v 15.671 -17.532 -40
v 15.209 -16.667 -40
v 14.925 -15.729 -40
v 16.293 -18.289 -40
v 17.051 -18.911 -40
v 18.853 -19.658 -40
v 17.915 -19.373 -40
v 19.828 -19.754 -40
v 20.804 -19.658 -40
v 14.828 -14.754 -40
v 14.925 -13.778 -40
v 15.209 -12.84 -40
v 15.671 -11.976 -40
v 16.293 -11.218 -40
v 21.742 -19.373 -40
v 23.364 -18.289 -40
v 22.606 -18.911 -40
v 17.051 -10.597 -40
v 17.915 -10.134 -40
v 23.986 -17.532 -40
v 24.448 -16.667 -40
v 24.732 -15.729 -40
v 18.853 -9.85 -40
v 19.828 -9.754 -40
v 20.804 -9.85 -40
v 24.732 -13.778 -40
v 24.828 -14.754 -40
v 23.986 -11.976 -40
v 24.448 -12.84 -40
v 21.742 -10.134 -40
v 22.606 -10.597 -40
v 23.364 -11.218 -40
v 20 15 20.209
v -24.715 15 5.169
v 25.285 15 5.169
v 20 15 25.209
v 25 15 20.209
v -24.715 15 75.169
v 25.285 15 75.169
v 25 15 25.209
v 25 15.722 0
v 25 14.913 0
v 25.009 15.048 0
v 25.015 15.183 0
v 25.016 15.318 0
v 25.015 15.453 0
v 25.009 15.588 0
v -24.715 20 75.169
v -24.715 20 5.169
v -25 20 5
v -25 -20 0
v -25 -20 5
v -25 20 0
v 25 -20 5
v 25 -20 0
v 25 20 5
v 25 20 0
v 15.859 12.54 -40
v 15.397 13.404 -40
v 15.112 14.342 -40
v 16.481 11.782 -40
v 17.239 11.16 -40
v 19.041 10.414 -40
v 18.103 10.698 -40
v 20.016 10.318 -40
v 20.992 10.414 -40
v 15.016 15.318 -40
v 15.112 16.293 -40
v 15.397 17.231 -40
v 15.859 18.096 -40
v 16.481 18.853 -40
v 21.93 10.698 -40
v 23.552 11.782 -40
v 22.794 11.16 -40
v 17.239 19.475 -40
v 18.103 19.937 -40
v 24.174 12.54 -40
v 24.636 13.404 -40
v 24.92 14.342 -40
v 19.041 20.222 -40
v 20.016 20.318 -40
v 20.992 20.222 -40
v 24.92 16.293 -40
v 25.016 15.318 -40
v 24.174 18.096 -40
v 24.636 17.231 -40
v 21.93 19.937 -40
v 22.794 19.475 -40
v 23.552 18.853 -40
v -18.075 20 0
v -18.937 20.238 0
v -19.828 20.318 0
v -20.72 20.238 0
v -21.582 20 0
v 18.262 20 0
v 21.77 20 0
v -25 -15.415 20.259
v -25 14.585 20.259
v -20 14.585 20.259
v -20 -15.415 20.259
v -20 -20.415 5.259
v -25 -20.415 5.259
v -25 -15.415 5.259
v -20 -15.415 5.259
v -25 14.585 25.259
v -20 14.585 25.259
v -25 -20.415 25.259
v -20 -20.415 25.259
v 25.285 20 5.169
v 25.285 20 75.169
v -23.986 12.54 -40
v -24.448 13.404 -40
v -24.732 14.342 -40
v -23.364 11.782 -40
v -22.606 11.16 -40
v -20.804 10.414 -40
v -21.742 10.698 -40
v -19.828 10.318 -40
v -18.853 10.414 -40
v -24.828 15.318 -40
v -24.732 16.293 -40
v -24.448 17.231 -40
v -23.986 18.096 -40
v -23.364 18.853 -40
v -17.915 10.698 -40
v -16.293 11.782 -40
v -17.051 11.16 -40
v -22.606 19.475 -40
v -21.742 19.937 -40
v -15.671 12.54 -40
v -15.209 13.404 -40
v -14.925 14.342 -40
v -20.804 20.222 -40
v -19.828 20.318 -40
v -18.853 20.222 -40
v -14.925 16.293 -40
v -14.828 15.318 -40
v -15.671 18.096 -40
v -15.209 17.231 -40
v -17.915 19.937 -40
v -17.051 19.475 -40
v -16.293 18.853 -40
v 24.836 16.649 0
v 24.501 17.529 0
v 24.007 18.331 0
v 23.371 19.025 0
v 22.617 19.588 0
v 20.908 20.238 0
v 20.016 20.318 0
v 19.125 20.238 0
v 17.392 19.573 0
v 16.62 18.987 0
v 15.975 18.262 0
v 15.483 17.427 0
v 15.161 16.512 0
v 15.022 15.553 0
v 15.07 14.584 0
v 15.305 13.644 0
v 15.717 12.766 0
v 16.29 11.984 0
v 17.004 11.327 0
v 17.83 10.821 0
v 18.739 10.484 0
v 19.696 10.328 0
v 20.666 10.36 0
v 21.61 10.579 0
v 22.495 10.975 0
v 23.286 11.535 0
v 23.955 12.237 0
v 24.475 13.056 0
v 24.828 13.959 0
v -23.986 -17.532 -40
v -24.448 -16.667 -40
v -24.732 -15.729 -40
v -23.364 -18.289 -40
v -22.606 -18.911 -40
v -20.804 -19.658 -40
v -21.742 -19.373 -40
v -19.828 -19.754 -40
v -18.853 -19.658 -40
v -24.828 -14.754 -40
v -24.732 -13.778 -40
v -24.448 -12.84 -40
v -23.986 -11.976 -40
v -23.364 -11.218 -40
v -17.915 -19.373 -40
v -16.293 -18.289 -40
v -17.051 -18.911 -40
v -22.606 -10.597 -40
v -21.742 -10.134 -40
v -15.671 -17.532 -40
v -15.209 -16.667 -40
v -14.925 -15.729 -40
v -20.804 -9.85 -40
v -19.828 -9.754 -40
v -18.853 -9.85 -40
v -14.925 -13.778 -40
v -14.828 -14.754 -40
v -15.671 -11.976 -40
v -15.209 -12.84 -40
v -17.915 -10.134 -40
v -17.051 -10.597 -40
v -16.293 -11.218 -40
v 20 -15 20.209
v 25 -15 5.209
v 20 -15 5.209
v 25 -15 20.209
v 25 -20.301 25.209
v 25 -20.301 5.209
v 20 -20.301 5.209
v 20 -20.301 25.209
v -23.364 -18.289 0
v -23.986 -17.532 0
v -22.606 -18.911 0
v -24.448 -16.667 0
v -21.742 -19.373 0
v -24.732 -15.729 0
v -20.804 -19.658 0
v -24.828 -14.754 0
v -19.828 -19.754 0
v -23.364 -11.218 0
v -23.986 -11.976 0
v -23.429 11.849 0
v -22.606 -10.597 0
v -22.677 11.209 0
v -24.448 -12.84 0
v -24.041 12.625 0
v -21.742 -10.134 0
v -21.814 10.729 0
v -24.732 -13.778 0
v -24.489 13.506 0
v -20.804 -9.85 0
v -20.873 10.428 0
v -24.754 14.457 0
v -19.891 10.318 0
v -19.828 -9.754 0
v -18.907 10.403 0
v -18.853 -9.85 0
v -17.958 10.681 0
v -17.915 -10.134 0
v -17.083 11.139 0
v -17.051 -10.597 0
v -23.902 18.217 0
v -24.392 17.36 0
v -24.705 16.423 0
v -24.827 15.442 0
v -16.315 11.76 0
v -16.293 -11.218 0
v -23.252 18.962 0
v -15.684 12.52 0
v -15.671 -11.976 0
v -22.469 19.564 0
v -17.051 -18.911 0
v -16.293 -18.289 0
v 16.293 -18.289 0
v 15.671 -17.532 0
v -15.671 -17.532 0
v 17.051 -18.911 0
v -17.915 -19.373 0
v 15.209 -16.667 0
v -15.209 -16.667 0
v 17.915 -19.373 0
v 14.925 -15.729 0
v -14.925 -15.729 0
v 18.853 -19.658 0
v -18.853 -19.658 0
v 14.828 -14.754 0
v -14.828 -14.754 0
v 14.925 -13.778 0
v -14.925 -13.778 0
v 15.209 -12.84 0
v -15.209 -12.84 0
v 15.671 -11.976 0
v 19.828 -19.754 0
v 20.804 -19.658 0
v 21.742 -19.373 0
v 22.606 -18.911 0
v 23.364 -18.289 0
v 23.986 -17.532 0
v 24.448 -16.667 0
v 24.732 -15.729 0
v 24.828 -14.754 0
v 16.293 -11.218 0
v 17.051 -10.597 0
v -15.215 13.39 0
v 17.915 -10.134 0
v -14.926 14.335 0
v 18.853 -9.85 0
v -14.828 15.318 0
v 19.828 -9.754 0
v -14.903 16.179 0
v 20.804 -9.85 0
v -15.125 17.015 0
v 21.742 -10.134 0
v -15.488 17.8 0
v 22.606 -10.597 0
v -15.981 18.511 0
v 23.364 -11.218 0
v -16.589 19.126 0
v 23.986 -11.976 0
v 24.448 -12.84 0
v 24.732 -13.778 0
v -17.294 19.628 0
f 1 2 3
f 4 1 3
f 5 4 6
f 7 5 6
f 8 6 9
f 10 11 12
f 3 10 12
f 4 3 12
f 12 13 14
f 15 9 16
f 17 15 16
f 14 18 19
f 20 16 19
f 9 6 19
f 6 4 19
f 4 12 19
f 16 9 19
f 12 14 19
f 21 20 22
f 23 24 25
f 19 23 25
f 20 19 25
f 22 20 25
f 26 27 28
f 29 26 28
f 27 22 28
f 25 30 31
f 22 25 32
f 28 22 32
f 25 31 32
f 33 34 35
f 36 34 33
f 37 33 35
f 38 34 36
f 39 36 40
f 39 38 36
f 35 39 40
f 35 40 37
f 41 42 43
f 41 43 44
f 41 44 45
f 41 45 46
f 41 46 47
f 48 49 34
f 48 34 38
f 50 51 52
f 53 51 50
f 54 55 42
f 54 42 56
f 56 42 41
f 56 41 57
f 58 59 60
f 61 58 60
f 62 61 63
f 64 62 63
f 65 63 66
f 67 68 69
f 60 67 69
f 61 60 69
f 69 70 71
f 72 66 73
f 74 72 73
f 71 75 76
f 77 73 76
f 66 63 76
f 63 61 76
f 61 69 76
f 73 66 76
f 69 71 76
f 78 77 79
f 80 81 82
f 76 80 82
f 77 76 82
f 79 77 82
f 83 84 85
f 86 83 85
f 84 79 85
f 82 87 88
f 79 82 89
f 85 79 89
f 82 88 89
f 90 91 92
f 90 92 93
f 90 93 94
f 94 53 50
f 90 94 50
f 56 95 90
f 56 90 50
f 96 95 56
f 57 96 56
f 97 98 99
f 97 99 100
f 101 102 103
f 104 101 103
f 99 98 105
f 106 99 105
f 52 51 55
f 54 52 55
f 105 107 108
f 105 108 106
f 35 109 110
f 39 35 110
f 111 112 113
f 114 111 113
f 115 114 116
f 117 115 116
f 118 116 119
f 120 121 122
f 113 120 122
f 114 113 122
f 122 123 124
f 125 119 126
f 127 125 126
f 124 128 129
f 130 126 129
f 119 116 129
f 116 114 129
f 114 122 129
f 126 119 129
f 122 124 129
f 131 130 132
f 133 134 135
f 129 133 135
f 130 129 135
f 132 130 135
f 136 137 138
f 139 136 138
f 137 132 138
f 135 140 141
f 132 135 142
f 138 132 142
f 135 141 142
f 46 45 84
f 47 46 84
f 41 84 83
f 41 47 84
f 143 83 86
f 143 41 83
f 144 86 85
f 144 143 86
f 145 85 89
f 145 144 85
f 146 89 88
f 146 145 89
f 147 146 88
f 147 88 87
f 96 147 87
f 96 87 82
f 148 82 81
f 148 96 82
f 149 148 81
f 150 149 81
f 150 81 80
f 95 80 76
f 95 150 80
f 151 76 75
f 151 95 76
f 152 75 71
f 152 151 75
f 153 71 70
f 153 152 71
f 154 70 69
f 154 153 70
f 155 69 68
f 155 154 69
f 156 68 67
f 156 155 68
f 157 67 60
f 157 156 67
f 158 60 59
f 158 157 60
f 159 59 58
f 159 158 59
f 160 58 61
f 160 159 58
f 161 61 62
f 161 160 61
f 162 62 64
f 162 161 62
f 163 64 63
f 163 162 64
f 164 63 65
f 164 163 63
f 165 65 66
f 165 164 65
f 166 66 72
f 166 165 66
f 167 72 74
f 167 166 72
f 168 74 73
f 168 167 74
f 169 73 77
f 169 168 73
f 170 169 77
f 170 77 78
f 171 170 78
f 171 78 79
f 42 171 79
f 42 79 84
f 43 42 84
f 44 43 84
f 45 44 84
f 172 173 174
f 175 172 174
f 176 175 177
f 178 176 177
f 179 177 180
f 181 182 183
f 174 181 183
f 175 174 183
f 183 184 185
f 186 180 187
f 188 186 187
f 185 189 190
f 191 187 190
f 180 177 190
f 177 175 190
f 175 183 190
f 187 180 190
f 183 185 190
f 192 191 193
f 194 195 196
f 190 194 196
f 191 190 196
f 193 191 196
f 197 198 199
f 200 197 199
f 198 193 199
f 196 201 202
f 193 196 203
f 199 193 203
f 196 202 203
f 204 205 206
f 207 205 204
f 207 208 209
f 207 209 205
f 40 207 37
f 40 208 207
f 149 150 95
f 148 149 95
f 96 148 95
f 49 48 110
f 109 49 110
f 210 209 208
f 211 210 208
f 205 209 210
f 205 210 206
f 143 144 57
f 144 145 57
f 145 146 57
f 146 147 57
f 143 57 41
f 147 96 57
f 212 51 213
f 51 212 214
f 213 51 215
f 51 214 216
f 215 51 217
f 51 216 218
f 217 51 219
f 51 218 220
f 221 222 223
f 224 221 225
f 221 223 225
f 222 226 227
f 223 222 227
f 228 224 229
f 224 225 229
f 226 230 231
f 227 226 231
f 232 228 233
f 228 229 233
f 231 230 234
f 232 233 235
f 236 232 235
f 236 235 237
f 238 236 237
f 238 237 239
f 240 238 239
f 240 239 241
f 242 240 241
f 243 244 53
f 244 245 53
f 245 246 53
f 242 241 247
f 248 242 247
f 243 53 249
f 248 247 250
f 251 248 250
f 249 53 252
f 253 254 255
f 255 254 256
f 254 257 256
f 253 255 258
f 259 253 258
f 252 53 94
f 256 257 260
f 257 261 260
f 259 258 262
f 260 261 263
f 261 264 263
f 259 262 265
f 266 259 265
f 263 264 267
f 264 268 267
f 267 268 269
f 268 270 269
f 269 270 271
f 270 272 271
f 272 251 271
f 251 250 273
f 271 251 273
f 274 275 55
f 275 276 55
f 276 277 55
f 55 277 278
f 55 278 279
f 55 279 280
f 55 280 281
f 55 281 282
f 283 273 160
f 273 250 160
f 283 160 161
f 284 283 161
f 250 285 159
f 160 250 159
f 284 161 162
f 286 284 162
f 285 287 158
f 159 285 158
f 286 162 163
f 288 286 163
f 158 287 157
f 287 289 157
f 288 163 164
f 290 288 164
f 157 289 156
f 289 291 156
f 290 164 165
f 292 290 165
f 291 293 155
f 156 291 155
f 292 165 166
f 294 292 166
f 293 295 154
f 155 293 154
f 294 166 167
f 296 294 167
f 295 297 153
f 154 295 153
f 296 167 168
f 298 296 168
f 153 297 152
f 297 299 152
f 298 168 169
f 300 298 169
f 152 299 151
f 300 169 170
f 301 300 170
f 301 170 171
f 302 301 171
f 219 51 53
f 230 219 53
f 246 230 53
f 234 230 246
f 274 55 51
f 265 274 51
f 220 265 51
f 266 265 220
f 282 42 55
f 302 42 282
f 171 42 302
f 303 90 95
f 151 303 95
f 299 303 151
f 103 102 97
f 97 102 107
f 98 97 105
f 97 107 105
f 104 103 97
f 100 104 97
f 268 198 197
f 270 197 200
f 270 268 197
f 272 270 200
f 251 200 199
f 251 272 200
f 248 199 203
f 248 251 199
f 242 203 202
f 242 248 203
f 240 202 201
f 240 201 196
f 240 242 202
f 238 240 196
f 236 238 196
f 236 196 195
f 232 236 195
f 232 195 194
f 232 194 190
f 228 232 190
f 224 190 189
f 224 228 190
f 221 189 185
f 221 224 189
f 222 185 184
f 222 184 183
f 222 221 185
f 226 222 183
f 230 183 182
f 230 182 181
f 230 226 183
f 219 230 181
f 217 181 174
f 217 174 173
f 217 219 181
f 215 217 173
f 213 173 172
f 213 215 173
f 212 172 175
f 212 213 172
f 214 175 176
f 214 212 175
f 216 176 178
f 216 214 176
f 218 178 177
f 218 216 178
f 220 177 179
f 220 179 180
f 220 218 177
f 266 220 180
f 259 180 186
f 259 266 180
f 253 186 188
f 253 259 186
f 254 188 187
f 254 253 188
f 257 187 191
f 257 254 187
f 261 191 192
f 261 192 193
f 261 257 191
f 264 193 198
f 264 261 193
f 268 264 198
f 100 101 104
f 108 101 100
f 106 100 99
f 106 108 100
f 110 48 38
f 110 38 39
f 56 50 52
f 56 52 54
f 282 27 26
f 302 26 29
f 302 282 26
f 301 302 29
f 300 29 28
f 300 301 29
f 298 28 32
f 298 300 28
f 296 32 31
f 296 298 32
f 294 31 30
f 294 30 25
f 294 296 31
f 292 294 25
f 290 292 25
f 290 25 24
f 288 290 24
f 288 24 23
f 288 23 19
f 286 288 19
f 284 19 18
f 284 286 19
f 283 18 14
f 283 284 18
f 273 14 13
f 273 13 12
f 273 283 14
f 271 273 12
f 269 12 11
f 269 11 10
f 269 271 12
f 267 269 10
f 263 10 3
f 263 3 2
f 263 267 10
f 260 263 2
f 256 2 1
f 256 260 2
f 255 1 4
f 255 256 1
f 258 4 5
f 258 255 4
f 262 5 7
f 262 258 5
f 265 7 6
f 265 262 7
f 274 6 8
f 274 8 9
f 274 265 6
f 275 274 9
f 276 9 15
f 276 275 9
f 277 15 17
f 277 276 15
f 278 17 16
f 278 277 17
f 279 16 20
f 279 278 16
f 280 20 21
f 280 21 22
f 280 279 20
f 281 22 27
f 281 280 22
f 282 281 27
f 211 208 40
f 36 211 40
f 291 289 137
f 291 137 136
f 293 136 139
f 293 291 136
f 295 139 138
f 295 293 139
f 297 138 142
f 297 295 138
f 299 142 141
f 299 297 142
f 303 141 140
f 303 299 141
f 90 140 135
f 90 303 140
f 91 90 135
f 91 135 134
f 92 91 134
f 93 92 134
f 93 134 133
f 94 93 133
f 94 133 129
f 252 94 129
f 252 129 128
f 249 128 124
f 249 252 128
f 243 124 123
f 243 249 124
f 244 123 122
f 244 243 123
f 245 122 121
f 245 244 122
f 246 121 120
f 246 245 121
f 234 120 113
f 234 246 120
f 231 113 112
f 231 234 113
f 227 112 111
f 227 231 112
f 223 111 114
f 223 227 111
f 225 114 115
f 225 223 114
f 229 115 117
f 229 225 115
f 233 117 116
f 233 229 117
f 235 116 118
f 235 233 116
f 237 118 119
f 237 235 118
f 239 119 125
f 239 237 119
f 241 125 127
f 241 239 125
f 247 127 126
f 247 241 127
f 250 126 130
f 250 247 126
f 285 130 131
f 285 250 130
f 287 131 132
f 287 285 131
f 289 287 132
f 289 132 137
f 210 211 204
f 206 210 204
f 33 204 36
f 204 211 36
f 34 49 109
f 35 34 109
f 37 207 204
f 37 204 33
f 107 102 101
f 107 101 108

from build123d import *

# Parameters (mm, degrees)
F1_R      = 5
F2_DEPTH  = 40
F0_W      = 50
F0_H      = 40
F3_DEPTH  = 5
F5_W      = 50
F5_H      = 70
F6_DEPTH  = 5
F9_W      = 40
F9_H      = 20
F10_DEPTH = 5
F11_W     = 30
F11_H     = 15
F12_DEPTH = 5
F13_W     = 35
F13_H     = 20
F14_DEPTH = 5
F15_W     = 30
F15_H     = 15
F16_DEPTH = 5


with BuildPart() as f2:
    # F1 (on Top) → F2 (new body)
    with BuildSketch(Plane.XY):
        with Locations((-19.828461, 15.317721)):
            Circle(F1_R)
        with Locations((-19.828461, -14.753879)):
            Circle(F1_R)
        with Locations((20.016409, 15.317721)):
            Circle(F1_R)
        with Locations((19.828461, -14.753879)):
            Circle(F1_R)
    extrude(amount=-F2_DEPTH)

    # F0 (on Top) → F3 (join)
    with BuildSketch(Plane.XY):
        Rectangle(F0_W, F0_H)
    extrude(amount=F3_DEPTH)


with BuildPart() as f6:
    # F5 (on offset) → F6 (new body)
    with BuildSketch(Plane.XZ.offset(-20)):
        with Locations((0.284906, 40.168556)):
            Rectangle(F5_W, F5_H)
    extrude(amount=F6_DEPTH)

    # F9 (on offset) → F10 (join)
    with BuildSketch(Plane.YZ.offset(25)):
        with Locations((-0.30131, 15.209289)):
            Rectangle(F9_W, F9_H)
    extrude(amount=-F10_DEPTH)

    # F11 (on face) → F12 (cut)
    with BuildSketch(Plane.YZ.offset(25)):
        with Locations((0, 12.709289)):
            Rectangle(F11_W, F11_H)
    extrude(amount=-F12_DEPTH, mode=Mode.SUBTRACT)


with BuildPart() as f14:
    # F13 (on offset) → F14 (new body)
    with BuildSketch(Plane.YZ.offset(-25)):
        with Locations((-2.915219, 15.258641)):
            Rectangle(F13_W, F13_H)
    extrude(amount=F14_DEPTH)

    # F15 (on face) → F16 (cut)
    with BuildSketch(Plane(origin=(-25, 0, 0), x_dir=(0, -1, 0), z_dir=(-1, 0, 0))):
        with Locations((0.415219, 12.758641)):
            Rectangle(F15_W, F15_H)
    extrude(amount=-F16_DEPTH, mode=Mode.SUBTRACT)


solid = Compound([f2.part, f6.part, f14.part])
